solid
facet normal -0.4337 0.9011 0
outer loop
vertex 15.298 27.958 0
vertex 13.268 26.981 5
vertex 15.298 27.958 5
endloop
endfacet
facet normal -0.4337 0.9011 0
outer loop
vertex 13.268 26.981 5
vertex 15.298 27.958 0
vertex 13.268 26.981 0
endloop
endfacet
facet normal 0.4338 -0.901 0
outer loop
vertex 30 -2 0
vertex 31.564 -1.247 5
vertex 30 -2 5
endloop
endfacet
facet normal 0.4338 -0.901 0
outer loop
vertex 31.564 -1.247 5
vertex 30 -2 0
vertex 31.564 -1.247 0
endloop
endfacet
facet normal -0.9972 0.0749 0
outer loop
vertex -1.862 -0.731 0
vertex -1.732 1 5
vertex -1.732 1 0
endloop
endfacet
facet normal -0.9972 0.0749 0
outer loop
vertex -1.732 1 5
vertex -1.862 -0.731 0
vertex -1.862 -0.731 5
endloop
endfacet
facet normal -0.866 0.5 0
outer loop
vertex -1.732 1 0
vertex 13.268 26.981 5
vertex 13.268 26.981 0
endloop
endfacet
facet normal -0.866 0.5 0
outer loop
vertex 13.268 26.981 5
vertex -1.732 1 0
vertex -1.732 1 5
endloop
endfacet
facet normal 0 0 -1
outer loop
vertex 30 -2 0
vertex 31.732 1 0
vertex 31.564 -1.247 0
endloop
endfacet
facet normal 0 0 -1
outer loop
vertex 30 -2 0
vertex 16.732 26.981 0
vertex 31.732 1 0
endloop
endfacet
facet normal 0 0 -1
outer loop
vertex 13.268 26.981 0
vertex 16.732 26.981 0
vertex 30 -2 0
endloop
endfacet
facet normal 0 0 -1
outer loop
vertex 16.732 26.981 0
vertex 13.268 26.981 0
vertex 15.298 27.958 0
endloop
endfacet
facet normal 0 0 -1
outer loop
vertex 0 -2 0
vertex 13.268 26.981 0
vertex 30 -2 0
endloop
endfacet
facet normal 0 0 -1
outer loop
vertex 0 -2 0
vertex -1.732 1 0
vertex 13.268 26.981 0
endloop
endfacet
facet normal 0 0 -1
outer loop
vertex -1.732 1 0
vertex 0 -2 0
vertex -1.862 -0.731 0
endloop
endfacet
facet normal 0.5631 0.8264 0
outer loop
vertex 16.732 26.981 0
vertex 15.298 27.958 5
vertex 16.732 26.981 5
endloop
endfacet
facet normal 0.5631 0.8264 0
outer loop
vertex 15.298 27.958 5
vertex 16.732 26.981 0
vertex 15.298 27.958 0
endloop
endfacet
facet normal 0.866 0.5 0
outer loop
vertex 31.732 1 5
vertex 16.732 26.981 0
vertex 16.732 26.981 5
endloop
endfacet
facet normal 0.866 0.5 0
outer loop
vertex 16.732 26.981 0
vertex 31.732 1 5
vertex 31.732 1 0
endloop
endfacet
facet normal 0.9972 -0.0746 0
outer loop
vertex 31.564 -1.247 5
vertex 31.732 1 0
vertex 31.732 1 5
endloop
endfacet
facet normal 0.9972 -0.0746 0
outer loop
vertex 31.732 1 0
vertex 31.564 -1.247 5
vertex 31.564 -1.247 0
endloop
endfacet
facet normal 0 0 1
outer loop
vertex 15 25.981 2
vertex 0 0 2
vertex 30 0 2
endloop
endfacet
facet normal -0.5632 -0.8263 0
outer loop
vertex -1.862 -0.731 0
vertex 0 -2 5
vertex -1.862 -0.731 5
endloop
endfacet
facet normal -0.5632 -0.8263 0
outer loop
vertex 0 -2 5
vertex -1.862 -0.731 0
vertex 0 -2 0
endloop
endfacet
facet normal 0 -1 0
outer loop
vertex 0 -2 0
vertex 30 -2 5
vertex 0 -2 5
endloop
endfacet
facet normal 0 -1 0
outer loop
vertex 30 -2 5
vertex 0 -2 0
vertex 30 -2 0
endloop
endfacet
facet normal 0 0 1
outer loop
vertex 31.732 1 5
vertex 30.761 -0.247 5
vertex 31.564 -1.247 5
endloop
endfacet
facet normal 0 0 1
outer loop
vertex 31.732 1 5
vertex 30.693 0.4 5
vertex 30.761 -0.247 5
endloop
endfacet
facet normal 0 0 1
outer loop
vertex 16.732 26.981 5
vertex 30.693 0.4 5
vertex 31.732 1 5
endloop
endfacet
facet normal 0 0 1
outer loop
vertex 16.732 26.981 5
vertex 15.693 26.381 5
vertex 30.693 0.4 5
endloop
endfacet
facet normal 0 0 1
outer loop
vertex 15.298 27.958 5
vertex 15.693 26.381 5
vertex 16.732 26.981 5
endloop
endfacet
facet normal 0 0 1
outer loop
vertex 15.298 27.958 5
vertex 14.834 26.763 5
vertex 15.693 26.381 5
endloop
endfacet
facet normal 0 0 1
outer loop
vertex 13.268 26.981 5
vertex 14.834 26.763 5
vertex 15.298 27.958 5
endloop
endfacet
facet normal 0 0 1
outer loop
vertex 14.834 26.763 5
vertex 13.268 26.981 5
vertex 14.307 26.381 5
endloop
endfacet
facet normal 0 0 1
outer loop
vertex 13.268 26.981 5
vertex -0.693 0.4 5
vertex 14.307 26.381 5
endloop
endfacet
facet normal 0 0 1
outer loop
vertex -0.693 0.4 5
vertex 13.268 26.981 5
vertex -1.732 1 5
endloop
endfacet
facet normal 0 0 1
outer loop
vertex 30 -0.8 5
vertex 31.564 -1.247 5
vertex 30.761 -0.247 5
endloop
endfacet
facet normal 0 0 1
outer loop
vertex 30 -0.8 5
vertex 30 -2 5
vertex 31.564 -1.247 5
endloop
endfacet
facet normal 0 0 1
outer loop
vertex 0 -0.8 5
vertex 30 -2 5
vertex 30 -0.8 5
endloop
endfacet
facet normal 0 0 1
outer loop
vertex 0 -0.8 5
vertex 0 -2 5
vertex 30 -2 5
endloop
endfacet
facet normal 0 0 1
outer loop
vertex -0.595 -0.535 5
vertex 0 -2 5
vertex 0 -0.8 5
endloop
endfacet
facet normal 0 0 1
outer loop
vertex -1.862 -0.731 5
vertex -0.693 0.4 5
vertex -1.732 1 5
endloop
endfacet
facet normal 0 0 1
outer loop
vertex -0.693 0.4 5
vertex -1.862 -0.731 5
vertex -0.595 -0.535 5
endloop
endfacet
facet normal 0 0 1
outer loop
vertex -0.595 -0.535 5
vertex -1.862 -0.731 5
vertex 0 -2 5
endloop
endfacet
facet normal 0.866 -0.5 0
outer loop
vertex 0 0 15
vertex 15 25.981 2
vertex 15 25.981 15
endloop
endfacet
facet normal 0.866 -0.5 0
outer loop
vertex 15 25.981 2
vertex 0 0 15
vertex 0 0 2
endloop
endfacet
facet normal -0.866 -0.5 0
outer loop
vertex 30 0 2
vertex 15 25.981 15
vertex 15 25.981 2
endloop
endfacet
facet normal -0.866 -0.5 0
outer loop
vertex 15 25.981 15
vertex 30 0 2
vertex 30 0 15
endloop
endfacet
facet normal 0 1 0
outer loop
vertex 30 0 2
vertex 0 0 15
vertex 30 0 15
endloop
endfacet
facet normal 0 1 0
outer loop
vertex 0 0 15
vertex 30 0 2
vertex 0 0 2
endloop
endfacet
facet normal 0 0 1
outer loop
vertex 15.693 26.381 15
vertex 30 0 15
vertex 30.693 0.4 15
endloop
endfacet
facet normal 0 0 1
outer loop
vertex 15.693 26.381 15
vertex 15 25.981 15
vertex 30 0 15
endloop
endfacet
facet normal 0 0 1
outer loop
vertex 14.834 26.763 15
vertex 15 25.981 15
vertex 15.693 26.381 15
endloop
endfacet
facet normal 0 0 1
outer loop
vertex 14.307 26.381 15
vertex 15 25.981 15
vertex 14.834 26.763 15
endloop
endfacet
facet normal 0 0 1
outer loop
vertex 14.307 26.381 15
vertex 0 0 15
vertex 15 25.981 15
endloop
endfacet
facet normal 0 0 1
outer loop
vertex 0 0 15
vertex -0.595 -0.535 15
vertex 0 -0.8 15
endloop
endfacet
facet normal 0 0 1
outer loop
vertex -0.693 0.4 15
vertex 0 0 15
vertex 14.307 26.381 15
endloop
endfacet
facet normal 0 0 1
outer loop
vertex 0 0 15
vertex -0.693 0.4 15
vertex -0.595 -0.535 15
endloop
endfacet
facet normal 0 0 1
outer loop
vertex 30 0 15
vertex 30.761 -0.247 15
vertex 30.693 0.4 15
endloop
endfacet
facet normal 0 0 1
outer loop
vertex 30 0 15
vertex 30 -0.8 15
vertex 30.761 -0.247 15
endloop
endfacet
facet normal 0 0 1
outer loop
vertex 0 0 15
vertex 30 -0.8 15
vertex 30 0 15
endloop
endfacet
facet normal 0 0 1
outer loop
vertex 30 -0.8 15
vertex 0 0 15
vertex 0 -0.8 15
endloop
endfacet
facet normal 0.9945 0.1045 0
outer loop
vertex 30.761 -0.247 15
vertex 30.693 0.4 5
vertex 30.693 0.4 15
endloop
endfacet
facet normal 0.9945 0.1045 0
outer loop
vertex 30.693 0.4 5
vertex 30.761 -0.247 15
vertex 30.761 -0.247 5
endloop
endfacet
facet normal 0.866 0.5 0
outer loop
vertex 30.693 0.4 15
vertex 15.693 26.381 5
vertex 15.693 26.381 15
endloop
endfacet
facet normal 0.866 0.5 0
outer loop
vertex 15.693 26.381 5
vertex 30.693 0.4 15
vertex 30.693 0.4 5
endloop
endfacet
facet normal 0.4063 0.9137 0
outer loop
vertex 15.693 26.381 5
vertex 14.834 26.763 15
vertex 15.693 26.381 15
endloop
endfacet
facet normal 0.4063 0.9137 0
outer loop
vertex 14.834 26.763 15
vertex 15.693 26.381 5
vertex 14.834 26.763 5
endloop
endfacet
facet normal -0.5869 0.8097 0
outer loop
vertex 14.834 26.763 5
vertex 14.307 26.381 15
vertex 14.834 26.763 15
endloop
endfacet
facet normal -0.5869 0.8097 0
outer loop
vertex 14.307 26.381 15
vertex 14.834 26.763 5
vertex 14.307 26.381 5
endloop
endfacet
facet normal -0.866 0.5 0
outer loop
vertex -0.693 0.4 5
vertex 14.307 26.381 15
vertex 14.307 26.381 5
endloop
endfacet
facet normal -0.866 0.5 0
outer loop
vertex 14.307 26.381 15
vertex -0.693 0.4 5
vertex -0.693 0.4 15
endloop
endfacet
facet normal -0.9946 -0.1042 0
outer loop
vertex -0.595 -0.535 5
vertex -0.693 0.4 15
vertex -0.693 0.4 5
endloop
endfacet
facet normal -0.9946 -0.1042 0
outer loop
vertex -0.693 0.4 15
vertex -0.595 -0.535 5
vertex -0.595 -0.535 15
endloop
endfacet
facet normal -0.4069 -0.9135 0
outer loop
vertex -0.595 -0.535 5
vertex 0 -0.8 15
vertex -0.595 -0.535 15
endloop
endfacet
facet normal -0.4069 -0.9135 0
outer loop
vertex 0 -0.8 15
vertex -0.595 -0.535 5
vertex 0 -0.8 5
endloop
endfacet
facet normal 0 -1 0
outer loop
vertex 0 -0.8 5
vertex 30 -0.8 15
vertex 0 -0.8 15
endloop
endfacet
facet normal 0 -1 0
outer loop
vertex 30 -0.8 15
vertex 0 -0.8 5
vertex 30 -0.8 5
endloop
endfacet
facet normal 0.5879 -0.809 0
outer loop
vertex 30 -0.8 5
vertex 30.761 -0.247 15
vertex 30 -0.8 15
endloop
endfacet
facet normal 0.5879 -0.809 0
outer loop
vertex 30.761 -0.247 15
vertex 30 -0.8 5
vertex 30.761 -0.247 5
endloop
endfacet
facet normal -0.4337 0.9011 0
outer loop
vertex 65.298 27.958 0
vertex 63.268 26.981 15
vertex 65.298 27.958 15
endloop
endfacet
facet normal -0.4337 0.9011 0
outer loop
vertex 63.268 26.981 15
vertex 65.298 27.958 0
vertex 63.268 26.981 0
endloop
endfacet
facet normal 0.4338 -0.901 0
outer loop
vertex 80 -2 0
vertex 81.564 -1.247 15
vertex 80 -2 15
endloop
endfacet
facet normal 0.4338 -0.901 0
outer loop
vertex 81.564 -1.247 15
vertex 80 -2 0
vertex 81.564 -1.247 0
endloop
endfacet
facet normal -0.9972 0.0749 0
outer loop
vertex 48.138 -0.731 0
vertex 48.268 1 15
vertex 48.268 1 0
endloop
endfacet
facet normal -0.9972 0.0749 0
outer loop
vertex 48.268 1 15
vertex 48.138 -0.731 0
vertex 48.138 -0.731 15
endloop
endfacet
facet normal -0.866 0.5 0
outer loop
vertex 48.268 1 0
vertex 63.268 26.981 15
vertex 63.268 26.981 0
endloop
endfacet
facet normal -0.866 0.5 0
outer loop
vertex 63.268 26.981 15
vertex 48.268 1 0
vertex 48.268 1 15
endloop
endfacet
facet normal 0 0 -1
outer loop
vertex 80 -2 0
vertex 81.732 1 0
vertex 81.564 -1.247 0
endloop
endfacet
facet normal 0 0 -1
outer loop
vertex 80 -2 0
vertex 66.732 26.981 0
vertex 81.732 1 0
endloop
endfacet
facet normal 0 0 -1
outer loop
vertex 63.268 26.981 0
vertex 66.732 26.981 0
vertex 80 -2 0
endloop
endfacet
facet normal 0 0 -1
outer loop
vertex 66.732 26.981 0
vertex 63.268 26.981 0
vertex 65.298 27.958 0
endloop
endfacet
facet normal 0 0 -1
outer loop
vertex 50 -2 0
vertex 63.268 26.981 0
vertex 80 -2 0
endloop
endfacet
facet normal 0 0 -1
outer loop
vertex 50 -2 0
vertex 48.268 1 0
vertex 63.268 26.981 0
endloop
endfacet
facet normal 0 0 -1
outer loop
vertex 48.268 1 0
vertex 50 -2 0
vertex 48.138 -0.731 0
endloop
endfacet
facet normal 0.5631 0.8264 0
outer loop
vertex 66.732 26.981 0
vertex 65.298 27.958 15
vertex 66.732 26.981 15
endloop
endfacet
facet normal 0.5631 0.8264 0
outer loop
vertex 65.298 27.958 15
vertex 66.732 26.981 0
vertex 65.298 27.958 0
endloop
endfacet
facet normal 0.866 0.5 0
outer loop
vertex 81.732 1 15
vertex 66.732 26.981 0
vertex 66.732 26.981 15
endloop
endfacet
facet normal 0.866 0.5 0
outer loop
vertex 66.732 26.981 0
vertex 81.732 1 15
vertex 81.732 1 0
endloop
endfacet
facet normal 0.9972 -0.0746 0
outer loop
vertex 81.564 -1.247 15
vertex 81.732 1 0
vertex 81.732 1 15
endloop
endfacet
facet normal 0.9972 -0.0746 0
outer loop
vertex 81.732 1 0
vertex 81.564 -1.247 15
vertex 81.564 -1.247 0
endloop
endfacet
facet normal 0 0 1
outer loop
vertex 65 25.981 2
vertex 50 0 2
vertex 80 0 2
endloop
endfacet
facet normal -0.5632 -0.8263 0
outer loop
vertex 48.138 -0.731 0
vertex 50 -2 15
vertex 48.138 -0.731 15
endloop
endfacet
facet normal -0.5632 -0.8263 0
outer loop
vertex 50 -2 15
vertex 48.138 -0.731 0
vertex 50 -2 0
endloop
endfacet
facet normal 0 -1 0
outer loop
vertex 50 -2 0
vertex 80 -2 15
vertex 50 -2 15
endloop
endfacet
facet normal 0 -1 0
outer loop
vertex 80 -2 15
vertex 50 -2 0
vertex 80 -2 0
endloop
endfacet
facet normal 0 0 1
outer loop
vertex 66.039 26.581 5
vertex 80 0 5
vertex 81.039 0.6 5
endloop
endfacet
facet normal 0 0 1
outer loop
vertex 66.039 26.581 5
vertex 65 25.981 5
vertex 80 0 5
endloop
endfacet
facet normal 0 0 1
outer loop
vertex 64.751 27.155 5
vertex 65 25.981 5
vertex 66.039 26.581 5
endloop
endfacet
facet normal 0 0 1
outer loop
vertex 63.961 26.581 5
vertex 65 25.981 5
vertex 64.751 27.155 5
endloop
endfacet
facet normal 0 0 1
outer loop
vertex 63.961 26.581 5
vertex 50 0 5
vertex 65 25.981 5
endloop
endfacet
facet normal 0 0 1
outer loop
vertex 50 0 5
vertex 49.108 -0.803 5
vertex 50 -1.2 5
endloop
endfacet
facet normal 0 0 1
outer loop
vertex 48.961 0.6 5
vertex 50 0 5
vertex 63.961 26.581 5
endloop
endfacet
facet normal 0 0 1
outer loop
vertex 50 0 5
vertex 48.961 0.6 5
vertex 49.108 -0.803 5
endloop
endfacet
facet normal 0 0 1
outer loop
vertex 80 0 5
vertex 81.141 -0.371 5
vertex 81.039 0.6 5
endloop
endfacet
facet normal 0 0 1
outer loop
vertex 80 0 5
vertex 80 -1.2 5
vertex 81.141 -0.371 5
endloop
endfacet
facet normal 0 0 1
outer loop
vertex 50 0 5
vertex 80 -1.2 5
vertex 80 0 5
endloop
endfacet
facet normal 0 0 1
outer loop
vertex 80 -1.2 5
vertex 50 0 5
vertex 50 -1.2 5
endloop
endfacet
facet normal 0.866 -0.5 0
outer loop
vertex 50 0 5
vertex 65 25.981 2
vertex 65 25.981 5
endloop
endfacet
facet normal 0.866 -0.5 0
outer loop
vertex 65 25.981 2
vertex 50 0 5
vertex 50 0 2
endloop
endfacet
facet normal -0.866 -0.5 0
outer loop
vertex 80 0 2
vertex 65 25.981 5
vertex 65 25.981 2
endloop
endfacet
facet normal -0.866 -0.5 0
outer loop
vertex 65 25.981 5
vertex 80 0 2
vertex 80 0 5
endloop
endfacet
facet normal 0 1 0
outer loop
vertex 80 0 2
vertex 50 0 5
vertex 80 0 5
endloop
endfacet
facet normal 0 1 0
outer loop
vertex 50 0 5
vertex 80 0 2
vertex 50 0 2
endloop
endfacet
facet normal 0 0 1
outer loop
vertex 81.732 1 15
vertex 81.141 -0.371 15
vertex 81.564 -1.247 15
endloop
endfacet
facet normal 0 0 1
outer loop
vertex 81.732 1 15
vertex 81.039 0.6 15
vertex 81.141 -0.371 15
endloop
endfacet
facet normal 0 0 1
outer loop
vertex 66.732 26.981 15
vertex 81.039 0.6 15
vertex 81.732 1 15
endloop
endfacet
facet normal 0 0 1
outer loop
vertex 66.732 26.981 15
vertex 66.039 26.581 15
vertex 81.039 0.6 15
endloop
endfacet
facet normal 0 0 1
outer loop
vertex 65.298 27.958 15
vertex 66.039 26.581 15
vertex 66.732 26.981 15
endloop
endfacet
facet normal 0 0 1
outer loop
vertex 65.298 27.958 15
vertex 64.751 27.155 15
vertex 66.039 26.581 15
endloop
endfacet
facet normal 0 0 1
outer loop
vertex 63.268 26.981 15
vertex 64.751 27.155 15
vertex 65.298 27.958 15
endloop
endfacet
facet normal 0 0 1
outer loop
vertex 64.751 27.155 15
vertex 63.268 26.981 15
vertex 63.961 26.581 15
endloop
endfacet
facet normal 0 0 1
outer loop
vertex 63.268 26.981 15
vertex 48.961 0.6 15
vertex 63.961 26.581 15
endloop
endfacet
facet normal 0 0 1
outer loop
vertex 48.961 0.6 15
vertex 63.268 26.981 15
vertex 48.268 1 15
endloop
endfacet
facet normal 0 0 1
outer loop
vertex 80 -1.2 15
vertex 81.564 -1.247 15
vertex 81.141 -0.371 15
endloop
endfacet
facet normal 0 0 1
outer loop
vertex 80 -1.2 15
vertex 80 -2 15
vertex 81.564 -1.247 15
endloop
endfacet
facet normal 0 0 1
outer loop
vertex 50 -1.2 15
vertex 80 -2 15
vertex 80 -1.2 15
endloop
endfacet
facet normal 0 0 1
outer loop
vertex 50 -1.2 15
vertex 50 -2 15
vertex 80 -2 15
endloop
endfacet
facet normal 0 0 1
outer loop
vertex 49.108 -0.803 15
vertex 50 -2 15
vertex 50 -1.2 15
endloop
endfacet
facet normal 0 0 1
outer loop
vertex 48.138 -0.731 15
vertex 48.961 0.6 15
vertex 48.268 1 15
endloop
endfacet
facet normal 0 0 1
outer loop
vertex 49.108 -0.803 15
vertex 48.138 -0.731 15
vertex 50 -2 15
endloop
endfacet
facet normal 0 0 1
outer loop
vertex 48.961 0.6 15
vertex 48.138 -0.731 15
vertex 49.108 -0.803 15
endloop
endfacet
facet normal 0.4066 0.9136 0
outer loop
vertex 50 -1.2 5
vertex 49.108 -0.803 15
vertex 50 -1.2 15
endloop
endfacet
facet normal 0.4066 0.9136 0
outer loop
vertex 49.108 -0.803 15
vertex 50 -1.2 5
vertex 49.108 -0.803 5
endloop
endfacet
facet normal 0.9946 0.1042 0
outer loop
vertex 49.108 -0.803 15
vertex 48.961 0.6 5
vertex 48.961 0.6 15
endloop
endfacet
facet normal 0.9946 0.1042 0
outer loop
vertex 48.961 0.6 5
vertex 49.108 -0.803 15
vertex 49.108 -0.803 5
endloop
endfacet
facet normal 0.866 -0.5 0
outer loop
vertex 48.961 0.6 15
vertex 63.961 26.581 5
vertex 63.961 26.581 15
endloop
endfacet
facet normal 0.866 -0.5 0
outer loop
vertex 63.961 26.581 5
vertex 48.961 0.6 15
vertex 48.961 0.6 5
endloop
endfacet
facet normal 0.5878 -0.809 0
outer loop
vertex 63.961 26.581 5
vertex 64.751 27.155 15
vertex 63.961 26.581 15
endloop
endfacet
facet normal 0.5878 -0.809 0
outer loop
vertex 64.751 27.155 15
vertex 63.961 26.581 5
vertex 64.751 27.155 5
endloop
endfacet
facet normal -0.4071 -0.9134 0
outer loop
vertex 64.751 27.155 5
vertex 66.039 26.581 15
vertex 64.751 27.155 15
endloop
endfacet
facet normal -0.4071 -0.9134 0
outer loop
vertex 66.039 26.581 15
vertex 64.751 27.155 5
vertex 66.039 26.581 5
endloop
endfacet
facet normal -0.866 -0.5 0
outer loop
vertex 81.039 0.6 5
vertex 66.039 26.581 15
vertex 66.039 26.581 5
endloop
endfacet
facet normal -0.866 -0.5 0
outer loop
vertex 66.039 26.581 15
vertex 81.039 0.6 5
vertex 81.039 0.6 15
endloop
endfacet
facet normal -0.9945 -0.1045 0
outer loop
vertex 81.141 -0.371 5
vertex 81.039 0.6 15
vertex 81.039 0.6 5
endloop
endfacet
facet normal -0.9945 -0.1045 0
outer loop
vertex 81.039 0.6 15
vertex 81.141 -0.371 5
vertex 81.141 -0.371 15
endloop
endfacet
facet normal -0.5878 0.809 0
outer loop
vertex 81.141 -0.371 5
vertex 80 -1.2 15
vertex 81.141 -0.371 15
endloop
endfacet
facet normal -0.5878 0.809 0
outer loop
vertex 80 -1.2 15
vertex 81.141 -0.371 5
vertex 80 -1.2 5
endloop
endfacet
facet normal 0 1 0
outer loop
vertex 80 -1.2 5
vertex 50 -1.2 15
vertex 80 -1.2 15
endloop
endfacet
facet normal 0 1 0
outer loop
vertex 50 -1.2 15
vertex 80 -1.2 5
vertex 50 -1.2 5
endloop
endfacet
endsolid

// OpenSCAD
module triangle_container(width, height, wall_thickness=1.2) {
	linear_extrude(wall_thickness) {
			offset(wall_thickness) {
				polygon([[0,0], [width,0], [width/2,sin(60) * width]]);
			}
	}

	linear_extrude(height) {
		difference() {
			offset(wall_thickness) {
				polygon([[0,0], [width,0], [width/2,sin(60) * width]]);
			}
			polygon([[0,0], [width,0], [width/2,sin(60) * width]]);
			
		}
	}
}

module triangle_container_case(width, height, wall_thickness=1.2) {
	
	triangle_container(width, height -10, wall_thickness);
	translate([0,0,height - 10]) {
		linear_extrude(10) {
			difference() {
				offset(wall_thickness/2 -.2) {
					polygon([[0,0], [width,0], [width/2,sin(60) * width]]);
				}
				polygon([[0,0], [width,0], [width/2,sin(60) * width]]);
				
			}
		}
	}
}

module triangle_container_lid(width, height, wall_thickness=2) {

	triangle_container(width, height -10, wall_thickness);
	translate([0,0,height -10]) {
		linear_extrude(10) {
			difference() {
				offset(wall_thickness) {
					polygon([[0,0], [width,0], [width/2,sin(60) * width]]);
				}
				offset(wall_thickness/2 + .2)
				polygon([[0,0], [width,0], [width/2,sin(60) * width]]);
				
			}
		}
	}
}

width = 30;

// Case
triangle_container_case(width, 15, 2);

//Lid
translate([width + 20, 0, 0]) {
	triangle_container_lid(width, 15, 2);
}
